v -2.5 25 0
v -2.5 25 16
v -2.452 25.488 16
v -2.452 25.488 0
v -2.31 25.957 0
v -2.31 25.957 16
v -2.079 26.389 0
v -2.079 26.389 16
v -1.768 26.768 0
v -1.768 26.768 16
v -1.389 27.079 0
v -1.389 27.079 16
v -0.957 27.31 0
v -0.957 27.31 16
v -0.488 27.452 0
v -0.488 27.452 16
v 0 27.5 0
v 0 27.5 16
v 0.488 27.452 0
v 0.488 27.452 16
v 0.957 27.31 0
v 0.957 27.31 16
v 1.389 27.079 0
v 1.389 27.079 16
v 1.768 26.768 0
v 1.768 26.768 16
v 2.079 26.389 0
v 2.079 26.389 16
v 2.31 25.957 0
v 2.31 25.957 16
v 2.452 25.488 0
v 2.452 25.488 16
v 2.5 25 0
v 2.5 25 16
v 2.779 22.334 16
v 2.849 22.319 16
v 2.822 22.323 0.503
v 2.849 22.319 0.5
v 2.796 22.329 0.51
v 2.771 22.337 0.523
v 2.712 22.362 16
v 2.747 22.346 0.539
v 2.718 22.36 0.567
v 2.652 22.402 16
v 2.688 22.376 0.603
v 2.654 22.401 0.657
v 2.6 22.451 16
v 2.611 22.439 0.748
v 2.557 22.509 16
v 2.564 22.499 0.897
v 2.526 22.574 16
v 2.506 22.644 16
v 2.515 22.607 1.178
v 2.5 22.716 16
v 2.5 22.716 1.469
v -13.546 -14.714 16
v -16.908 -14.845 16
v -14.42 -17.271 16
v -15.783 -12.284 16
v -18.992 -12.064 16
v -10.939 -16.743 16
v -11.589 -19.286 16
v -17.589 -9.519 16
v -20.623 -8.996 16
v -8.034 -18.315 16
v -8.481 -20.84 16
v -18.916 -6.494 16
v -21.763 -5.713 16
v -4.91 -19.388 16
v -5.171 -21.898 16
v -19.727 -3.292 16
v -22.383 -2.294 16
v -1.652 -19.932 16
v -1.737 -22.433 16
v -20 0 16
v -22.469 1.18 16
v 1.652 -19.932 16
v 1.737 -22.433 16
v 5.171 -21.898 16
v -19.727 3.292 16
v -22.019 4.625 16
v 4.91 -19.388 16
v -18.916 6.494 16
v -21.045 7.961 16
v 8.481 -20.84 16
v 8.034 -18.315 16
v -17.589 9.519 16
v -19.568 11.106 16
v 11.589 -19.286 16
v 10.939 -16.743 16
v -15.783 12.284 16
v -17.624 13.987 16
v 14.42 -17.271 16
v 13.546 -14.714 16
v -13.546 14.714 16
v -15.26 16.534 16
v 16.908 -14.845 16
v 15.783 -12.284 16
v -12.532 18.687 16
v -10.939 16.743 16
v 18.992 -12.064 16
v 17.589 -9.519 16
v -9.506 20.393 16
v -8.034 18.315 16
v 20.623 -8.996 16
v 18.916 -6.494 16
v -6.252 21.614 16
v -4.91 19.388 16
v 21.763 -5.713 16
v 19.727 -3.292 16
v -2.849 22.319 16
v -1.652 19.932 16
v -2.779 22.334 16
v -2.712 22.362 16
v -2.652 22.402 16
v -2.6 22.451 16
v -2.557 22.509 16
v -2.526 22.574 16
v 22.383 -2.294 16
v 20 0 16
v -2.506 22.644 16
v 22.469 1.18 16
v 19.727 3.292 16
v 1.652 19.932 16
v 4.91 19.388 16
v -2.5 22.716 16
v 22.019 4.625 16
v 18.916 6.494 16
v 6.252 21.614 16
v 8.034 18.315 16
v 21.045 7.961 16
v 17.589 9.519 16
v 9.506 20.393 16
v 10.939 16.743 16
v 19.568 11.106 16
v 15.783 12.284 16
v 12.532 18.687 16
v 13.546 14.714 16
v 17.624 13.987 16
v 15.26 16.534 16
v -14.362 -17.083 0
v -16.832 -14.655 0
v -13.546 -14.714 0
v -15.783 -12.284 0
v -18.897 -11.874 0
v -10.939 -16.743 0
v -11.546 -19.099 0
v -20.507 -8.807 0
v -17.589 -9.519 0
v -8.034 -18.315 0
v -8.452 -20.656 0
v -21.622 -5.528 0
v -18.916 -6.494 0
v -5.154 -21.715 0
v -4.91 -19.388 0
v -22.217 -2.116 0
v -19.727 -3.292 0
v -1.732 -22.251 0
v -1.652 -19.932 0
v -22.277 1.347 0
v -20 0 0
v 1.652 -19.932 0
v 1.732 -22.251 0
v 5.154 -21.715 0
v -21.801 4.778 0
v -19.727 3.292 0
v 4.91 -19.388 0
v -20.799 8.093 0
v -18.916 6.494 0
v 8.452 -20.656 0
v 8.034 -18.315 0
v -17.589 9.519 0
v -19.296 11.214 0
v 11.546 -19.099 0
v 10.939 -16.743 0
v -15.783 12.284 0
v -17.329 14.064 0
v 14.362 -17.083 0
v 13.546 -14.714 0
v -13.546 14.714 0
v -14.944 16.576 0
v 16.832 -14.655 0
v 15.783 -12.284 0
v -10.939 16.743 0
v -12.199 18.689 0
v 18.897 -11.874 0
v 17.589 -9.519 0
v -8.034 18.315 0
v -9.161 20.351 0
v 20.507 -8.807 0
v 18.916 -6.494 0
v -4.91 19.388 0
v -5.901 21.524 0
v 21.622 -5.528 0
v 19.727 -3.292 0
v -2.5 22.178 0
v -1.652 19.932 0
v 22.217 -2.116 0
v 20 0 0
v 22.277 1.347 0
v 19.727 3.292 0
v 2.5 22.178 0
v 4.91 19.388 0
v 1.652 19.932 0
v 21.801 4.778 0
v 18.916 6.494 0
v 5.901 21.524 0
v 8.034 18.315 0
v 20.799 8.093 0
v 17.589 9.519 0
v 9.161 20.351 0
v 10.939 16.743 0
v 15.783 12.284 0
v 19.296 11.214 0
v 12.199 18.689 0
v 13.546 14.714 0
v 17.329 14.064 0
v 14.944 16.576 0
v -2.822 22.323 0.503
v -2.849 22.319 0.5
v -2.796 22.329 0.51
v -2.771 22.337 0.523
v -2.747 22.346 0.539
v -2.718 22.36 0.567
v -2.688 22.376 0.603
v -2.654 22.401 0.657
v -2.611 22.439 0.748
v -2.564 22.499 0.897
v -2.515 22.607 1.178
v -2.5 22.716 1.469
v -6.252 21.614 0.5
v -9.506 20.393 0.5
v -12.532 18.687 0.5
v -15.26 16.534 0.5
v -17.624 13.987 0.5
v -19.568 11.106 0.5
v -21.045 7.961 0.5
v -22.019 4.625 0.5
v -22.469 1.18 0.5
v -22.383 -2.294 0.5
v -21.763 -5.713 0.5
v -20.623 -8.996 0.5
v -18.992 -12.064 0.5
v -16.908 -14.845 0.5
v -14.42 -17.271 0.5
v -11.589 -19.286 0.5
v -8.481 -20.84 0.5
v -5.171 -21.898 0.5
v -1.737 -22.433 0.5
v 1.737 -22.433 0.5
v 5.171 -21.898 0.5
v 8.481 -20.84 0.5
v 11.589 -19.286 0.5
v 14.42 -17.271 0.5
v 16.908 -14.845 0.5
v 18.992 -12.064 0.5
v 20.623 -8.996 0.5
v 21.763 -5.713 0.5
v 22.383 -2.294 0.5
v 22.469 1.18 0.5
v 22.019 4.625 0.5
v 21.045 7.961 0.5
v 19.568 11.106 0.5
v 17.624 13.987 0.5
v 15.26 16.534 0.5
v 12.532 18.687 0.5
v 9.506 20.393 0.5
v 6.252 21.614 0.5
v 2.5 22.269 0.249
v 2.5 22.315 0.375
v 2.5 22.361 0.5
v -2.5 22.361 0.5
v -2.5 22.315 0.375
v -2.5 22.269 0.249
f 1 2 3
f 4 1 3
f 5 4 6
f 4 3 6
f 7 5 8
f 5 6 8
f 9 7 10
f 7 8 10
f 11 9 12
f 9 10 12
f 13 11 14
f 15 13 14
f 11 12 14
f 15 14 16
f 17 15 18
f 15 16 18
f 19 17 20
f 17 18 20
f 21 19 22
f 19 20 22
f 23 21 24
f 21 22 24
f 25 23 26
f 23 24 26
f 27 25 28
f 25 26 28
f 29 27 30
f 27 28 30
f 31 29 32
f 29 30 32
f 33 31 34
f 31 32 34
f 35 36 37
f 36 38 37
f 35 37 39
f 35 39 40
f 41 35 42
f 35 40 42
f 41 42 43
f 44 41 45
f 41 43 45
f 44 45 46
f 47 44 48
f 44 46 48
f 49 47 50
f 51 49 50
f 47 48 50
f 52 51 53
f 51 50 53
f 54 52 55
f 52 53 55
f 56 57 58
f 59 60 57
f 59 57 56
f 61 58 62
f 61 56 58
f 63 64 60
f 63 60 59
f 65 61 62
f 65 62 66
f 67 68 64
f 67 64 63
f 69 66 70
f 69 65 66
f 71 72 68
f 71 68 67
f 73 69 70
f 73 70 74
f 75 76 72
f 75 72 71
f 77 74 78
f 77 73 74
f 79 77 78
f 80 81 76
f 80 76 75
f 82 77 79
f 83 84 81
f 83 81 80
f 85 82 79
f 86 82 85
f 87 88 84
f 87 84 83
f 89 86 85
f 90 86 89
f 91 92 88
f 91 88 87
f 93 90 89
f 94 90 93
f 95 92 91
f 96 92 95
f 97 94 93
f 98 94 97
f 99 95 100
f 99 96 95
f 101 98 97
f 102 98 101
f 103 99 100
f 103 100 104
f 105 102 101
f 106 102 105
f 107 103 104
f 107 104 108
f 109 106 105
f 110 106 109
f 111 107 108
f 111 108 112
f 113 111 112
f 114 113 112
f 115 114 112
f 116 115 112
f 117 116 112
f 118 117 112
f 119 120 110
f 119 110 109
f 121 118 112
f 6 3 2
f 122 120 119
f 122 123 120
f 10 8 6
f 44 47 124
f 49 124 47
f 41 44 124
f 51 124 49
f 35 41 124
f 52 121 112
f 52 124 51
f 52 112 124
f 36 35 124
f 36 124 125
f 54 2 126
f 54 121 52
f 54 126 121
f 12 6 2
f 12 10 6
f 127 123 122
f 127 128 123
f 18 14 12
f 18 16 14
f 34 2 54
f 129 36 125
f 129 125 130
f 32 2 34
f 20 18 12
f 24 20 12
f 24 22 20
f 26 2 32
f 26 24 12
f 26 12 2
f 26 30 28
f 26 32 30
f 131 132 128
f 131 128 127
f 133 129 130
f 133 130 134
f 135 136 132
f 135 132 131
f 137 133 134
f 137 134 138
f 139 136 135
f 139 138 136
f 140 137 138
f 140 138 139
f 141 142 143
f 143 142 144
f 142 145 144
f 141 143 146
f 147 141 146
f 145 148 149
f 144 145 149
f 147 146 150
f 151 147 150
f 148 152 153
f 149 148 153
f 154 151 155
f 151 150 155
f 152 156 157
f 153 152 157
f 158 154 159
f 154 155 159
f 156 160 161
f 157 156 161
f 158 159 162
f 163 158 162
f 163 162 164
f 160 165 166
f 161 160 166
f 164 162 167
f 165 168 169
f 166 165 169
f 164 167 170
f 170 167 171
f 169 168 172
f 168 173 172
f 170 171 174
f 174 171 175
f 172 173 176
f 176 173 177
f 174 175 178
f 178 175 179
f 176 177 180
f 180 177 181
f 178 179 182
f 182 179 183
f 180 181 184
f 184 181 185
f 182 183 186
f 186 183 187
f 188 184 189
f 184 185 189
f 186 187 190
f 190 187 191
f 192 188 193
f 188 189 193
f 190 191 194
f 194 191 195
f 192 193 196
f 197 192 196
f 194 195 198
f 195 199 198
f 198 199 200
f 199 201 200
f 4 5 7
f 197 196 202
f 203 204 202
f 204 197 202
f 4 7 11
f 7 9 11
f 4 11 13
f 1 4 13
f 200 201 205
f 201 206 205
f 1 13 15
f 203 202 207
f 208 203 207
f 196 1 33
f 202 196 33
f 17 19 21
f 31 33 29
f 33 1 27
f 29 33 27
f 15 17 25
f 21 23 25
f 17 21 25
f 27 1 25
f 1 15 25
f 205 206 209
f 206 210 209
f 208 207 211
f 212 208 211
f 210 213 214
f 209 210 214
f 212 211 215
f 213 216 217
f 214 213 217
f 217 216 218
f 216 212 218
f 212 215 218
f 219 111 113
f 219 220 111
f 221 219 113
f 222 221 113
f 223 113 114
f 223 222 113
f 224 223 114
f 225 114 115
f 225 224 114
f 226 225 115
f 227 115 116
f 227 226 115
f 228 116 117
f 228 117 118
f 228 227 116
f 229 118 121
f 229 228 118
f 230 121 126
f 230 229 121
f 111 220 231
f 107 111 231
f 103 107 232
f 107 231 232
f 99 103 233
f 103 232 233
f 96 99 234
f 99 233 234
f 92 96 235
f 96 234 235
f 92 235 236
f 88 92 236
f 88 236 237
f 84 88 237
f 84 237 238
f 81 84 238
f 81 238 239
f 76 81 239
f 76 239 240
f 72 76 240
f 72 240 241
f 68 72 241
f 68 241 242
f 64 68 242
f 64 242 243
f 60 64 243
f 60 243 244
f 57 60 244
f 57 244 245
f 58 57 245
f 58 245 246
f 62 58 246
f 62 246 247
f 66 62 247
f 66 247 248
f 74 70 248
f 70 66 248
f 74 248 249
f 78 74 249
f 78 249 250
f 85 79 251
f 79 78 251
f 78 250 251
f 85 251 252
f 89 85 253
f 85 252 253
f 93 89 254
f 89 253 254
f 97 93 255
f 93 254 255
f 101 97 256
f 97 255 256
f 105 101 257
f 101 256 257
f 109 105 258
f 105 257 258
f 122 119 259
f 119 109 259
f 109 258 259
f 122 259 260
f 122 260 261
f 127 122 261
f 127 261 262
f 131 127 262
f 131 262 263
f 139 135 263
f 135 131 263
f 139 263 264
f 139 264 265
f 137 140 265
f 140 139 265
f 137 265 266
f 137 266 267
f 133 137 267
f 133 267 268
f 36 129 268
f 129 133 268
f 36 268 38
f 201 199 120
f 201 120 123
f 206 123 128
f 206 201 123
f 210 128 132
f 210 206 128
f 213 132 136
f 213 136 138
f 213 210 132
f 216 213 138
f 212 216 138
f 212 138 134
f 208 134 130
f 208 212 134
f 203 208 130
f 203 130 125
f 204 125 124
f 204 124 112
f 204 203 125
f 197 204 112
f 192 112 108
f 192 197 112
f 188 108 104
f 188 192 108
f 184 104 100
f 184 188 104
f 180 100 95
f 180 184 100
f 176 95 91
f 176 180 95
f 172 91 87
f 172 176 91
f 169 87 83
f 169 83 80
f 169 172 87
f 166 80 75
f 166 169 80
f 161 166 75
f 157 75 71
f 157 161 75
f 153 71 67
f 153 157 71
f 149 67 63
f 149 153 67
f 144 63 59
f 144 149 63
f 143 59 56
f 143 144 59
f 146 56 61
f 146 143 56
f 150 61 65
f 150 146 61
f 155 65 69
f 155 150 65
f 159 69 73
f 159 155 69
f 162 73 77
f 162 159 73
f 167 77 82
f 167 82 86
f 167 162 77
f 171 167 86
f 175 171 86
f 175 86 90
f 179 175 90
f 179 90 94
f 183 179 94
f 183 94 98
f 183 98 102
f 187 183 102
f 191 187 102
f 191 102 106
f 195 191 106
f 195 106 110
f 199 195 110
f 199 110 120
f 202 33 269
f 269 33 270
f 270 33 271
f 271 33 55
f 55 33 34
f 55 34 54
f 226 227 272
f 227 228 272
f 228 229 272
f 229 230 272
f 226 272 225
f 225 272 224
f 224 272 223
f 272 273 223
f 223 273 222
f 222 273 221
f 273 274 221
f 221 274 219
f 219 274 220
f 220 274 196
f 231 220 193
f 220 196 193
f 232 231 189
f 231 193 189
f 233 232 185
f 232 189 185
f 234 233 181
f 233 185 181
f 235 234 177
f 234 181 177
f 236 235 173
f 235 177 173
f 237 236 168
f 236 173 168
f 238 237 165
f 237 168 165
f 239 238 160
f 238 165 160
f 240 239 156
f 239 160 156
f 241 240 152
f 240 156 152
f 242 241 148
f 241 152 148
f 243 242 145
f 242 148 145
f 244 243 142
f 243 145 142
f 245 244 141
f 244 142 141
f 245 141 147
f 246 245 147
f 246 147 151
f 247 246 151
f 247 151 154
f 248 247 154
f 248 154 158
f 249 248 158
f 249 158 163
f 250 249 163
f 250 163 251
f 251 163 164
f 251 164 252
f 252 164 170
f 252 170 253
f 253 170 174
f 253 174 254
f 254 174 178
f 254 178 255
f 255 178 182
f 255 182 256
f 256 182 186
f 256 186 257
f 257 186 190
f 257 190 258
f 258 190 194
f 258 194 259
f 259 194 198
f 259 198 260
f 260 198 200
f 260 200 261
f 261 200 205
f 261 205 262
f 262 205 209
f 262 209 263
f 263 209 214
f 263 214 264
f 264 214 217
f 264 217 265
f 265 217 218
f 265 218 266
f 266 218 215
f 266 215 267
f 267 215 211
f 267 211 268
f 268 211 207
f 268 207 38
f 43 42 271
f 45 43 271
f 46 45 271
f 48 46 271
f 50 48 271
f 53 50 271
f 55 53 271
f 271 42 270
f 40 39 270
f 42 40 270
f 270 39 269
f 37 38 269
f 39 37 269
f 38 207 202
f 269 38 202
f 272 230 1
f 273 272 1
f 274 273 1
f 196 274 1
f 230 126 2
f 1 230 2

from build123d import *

# Parameters (mm, degrees)
SKETCH1_R      = 22.5
SKETCH1_R_2    = 20
EXTRUDE1_DEPTH = 16
EXTRUDE2_DEPTH = 16
CHAMFER1_SIZE  = 0.5
CHAMFER1_SIZE2 = 0.181985117
FILLET1_R      = 0.4


with BuildPart() as part:
    # Sketch1 → Extrude1 (new body)
    with BuildSketch(Plane.XY):
        Circle(SKETCH1_R)
        Circle(SKETCH1_R_2, mode=Mode.SUBTRACT)
    extrude(amount=EXTRUDE1_DEPTH)

    # Sketch3 → Extrude2 (add)
    with BuildSketch(Plane.XY.offset(16)):
        with BuildLine():
            Line((2.5, 25), (2.5, 22.360679775))
            ThreePointArc((2.5, 22.360679775), (0, 22.5), (-2.5, 22.360679775))
            Line((-2.5, 22.360679775), (-2.5, 25))
            ThreePointArc((-2.5, 25), (0, 27.5), (2.5, 25))
        make_face()
    extrude(amount=-EXTRUDE2_DEPTH)

    # Chamfer1
    chamfer1_edges = [part.edges().sort_by_distance(p)[0] for p in [
        (0, -22.5, 0),
    ]]
    chamfer1_side = [part.faces().sort_by_distance(p)[0] for p in [
        (0, -22.5, 8),
    ]]
    chamfer(chamfer1_edges, length=CHAMFER1_SIZE, length2=CHAMFER1_SIZE2, reference=chamfer1_side[0])

    # Fillet1
    fillet1_edges = [part.edges().sort_by_distance(p)[0] for p in [
        (2.5, 22.360679775, 8.25),
        (-2.5, 22.360679775, 8.25),
    ]]
    fillet(fillet1_edges, radius=FILLET1_R)


solid = part.part
